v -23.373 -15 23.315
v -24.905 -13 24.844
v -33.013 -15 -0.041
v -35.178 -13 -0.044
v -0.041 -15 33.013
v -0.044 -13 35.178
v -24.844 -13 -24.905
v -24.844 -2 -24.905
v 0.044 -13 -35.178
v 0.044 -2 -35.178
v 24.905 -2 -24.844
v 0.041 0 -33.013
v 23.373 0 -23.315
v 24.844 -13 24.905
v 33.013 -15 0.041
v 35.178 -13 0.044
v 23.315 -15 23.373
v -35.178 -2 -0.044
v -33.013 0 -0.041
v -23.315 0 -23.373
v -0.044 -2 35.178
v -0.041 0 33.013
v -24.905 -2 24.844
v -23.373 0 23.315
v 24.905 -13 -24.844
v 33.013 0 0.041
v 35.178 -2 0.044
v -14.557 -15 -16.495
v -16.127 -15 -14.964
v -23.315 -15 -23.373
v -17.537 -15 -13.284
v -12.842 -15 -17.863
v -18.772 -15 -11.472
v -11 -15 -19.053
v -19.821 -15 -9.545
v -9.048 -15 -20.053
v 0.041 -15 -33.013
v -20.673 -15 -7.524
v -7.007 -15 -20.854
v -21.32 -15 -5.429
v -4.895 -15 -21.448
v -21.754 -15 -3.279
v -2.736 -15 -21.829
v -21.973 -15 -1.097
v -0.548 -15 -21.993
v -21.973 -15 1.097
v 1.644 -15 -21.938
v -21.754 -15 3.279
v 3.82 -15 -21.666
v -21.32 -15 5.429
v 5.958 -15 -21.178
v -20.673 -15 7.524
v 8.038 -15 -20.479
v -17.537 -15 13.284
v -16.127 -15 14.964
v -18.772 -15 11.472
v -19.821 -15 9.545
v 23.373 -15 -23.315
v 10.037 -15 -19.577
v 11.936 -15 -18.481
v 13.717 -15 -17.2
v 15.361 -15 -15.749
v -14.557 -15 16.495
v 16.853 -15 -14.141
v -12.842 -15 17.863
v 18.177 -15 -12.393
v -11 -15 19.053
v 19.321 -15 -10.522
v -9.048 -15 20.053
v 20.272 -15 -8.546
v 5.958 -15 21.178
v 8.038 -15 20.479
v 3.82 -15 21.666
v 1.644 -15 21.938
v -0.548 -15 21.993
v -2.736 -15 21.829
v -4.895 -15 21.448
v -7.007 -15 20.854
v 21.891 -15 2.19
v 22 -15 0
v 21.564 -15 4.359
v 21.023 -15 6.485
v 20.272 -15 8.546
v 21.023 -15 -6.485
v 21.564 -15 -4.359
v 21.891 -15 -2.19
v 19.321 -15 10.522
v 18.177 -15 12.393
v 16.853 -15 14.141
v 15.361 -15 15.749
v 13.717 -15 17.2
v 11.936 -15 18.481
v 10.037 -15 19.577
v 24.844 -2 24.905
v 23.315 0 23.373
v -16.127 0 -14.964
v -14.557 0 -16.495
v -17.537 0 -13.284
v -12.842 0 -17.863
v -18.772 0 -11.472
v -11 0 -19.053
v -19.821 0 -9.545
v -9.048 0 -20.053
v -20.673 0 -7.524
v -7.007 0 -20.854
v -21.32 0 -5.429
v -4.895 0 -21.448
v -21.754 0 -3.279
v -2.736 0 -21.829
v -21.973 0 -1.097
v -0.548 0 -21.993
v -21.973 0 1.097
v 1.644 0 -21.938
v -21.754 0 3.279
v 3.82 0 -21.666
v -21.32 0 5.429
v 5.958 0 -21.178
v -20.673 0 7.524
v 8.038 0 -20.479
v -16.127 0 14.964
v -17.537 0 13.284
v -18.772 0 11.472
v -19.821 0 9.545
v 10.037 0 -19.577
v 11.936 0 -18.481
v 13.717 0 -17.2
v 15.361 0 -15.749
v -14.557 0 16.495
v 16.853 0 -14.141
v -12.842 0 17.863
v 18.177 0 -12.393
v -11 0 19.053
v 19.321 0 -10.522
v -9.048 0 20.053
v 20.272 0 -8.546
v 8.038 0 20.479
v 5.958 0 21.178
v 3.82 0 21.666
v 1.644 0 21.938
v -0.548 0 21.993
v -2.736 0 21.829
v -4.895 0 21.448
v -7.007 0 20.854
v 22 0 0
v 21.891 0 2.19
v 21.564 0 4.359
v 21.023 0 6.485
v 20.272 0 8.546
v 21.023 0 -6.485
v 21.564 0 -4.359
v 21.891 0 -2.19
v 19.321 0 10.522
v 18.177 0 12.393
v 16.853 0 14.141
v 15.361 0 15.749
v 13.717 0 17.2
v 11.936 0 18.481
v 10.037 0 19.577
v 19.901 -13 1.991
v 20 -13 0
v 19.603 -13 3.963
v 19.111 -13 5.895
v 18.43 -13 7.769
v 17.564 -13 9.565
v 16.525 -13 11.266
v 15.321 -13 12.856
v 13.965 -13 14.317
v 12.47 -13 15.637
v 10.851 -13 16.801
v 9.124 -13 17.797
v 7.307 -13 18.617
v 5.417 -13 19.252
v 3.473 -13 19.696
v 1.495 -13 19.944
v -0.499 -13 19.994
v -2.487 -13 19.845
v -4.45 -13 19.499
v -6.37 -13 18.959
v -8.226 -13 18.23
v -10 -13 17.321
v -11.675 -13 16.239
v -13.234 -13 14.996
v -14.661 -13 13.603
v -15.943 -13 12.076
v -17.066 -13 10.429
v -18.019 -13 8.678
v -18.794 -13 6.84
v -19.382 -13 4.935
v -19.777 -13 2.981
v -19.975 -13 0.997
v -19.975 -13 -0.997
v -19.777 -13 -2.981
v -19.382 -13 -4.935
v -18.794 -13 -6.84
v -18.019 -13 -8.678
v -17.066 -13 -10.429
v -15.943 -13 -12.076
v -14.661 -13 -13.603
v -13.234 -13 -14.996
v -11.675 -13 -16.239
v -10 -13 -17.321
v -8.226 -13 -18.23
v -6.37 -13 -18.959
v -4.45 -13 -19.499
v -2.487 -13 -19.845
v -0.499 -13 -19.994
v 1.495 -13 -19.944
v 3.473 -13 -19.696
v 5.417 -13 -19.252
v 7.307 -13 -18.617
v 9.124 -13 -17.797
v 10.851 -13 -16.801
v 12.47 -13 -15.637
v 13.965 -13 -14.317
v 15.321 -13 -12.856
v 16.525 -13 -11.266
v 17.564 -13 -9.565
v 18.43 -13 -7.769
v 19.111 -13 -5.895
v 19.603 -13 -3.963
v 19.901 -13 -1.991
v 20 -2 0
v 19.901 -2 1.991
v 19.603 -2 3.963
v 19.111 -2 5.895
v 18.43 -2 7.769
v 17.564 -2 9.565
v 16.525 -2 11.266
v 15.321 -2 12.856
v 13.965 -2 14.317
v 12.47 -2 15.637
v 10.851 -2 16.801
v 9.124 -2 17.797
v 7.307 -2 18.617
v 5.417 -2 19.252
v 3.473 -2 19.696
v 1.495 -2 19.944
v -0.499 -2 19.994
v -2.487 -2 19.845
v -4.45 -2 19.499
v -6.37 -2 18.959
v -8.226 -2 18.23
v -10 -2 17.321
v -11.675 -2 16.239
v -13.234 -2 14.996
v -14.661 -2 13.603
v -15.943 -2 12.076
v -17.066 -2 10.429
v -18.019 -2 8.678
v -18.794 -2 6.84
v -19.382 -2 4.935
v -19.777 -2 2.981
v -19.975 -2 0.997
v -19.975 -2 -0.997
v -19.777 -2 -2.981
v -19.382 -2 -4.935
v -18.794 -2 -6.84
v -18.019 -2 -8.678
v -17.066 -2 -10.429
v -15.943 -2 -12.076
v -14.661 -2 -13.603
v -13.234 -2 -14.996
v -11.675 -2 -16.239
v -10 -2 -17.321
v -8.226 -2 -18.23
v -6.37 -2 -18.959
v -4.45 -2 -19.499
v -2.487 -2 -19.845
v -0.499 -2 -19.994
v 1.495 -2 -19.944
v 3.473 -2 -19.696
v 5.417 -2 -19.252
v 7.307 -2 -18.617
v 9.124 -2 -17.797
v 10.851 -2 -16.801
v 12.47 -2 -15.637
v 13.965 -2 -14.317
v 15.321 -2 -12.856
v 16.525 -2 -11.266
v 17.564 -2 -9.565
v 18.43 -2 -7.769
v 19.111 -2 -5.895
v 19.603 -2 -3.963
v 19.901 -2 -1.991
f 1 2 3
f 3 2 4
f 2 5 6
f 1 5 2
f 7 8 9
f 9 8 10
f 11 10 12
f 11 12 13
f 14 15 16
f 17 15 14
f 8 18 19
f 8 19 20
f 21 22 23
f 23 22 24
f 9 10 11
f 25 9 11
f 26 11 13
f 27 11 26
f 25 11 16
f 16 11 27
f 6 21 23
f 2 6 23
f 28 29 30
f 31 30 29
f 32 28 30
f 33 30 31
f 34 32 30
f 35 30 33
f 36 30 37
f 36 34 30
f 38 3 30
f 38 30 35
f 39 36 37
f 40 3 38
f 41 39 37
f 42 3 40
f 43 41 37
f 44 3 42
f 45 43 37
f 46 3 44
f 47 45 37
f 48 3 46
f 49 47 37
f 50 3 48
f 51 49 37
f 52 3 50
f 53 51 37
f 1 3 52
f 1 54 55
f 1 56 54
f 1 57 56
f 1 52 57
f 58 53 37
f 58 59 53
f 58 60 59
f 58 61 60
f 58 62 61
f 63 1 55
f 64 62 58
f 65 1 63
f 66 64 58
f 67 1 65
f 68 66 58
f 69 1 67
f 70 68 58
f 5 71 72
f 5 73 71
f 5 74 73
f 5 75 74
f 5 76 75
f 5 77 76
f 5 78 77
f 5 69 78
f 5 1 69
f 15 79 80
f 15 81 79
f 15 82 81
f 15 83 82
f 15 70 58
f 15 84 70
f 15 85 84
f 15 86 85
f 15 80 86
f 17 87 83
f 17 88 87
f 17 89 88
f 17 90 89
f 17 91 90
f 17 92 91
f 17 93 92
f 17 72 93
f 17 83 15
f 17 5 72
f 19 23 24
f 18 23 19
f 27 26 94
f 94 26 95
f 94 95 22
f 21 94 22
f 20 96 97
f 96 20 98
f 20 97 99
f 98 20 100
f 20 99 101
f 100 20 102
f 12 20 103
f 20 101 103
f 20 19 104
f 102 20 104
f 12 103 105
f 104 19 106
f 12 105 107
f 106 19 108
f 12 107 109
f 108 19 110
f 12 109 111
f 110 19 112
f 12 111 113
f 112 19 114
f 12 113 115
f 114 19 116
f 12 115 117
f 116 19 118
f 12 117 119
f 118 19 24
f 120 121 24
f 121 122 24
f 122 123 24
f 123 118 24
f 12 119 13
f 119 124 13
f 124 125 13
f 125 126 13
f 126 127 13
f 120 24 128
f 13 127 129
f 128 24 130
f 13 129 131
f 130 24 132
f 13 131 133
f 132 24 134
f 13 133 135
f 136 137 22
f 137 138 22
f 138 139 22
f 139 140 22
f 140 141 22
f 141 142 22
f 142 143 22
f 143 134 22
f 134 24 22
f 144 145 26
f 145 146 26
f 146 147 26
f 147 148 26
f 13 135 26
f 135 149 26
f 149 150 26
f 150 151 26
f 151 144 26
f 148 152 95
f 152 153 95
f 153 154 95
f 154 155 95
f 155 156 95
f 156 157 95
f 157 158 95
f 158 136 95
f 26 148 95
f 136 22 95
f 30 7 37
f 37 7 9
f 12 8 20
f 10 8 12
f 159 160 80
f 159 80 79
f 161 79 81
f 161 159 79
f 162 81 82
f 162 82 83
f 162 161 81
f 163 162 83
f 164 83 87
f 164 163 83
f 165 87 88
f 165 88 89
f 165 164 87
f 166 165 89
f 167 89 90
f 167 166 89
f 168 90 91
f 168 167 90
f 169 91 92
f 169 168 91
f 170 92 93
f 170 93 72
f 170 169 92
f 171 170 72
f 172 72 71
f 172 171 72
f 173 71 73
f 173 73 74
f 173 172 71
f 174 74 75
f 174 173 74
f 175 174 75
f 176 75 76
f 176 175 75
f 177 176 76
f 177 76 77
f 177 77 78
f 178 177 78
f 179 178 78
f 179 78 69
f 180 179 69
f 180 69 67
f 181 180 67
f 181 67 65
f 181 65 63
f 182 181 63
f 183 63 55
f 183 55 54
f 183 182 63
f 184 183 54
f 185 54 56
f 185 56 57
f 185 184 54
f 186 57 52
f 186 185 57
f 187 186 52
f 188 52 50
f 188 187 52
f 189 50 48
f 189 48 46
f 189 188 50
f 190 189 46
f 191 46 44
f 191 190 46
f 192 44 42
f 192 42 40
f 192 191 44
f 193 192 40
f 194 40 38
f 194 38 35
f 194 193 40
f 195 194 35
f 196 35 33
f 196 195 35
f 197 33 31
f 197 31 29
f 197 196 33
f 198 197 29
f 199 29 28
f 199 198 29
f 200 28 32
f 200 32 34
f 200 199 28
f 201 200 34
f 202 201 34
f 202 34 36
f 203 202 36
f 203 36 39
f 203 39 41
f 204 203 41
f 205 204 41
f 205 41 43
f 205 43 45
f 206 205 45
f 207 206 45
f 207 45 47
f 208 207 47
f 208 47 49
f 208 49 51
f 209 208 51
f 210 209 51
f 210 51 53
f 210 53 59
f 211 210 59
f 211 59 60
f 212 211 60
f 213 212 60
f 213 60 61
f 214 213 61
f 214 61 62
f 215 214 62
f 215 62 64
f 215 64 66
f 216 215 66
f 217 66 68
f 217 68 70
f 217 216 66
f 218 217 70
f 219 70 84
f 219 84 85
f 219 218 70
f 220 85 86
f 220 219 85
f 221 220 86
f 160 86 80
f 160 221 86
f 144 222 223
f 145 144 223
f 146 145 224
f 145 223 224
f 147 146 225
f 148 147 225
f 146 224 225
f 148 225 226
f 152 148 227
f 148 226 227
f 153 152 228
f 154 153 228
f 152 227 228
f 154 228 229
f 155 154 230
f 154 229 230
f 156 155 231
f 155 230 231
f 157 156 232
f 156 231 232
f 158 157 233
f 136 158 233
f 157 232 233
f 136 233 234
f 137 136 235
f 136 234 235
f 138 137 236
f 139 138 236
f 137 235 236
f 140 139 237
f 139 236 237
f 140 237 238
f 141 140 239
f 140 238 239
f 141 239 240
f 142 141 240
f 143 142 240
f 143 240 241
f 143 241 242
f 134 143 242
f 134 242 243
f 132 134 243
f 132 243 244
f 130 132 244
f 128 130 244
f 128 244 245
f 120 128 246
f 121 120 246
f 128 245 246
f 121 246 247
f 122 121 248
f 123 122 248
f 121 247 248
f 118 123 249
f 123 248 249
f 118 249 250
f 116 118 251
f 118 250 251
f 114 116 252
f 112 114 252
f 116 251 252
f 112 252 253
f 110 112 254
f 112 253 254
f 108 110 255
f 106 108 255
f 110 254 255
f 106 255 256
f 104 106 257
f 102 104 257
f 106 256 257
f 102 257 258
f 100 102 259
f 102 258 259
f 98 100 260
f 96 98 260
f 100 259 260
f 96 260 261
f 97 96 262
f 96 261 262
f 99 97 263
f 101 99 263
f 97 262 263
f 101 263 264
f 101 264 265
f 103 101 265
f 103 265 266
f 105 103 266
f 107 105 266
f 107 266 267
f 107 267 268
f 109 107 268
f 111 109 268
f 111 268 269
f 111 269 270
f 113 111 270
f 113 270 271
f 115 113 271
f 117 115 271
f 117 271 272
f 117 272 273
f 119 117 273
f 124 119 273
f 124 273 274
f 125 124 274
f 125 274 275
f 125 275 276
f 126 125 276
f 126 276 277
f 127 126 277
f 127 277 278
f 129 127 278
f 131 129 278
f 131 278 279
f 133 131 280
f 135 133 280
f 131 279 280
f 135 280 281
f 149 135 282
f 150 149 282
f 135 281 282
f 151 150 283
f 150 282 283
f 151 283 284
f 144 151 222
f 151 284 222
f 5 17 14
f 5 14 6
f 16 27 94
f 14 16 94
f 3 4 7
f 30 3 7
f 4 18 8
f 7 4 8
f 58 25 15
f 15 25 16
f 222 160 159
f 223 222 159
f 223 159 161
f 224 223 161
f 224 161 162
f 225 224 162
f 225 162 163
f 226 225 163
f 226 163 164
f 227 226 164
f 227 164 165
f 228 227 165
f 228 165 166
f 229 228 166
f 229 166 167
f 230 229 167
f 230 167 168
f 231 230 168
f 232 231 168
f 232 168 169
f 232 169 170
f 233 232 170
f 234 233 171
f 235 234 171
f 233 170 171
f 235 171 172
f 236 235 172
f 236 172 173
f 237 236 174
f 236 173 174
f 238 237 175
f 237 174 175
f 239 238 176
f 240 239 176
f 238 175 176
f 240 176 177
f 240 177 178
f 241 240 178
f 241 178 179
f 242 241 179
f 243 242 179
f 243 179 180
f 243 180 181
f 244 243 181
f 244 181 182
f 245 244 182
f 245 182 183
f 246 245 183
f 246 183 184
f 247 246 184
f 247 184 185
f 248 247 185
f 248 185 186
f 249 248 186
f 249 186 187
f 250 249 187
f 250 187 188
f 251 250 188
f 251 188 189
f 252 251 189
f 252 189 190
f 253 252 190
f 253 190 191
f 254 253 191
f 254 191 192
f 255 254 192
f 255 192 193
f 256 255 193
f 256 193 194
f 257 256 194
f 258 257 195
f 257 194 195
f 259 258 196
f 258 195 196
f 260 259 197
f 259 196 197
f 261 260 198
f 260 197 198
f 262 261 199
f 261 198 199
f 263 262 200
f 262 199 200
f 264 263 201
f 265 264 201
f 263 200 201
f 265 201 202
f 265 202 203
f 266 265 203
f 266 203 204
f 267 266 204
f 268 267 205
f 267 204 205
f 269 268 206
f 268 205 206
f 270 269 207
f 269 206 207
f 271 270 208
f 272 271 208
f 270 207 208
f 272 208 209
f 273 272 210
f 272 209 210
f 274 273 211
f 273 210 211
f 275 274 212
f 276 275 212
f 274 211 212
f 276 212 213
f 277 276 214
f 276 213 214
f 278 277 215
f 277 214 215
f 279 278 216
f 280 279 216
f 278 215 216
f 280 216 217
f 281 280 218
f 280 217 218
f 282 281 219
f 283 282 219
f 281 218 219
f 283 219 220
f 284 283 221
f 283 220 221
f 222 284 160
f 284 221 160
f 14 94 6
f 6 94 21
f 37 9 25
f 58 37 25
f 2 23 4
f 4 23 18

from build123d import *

# Parameters (mm, degrees)
F1_DEPTH = 15
F2_R     = 20
F3_DEPTH = 25
F4_SIZE  = 2


with BuildPart() as f1:
    # F0 (on Front) → F1 (new body)
    with BuildSketch(Plane.XZ):
        Polygon((24.8435035413, 24.90530428), (-0.0436997214, 35.1777193664), (-24.90530428, 24.8435035413), (-35.1777193664, -0.0436997214), (-24.8435035413, -24.90530428), (0.0436997214, -35.1777193664), (24.90530428, -24.8435035413), (35.1777193664, 0.0436997214), align=None)
    extrude(amount=F1_DEPTH)

    # F2 (on face) → F3 (cut)
    with BuildSketch(Plane.XZ.offset(15)):
        Circle(F2_R)
    extrude(amount=-F3_DEPTH, mode=Mode.SUBTRACT)

    # F4
    f4_edges = [f1.edges().sort_by_distance(p)[0] for p in [
        (30.041512, -15, -12.399902),
        (12.474502, -15, -30.010611),
        (30.010611, -15, 12.474502),
        (-12.399902, -15, -30.041512),
        (12.399902, -15, 30.041512),
        (-30.010611, -15, -12.474502),
        (-12.474502, -15, 30.010611),
        (-30.041512, -15, 12.399902),
        (-20, -15, 0),
        (30.041512, 0, -12.399902),
        (12.474502, 0, -30.010611),
        (30.010611, 0, 12.474502),
        (-12.399902, 0, -30.041512),
        (12.399902, 0, 30.041512),
        (-30.010611, 0, -12.474502),
        (-12.474502, 0, 30.010611),
        (-30.041512, 0, 12.399902),
        (-20, 0, 0),
    ]]
    chamfer(f4_edges, length=F4_SIZE)


solid = f1.part
